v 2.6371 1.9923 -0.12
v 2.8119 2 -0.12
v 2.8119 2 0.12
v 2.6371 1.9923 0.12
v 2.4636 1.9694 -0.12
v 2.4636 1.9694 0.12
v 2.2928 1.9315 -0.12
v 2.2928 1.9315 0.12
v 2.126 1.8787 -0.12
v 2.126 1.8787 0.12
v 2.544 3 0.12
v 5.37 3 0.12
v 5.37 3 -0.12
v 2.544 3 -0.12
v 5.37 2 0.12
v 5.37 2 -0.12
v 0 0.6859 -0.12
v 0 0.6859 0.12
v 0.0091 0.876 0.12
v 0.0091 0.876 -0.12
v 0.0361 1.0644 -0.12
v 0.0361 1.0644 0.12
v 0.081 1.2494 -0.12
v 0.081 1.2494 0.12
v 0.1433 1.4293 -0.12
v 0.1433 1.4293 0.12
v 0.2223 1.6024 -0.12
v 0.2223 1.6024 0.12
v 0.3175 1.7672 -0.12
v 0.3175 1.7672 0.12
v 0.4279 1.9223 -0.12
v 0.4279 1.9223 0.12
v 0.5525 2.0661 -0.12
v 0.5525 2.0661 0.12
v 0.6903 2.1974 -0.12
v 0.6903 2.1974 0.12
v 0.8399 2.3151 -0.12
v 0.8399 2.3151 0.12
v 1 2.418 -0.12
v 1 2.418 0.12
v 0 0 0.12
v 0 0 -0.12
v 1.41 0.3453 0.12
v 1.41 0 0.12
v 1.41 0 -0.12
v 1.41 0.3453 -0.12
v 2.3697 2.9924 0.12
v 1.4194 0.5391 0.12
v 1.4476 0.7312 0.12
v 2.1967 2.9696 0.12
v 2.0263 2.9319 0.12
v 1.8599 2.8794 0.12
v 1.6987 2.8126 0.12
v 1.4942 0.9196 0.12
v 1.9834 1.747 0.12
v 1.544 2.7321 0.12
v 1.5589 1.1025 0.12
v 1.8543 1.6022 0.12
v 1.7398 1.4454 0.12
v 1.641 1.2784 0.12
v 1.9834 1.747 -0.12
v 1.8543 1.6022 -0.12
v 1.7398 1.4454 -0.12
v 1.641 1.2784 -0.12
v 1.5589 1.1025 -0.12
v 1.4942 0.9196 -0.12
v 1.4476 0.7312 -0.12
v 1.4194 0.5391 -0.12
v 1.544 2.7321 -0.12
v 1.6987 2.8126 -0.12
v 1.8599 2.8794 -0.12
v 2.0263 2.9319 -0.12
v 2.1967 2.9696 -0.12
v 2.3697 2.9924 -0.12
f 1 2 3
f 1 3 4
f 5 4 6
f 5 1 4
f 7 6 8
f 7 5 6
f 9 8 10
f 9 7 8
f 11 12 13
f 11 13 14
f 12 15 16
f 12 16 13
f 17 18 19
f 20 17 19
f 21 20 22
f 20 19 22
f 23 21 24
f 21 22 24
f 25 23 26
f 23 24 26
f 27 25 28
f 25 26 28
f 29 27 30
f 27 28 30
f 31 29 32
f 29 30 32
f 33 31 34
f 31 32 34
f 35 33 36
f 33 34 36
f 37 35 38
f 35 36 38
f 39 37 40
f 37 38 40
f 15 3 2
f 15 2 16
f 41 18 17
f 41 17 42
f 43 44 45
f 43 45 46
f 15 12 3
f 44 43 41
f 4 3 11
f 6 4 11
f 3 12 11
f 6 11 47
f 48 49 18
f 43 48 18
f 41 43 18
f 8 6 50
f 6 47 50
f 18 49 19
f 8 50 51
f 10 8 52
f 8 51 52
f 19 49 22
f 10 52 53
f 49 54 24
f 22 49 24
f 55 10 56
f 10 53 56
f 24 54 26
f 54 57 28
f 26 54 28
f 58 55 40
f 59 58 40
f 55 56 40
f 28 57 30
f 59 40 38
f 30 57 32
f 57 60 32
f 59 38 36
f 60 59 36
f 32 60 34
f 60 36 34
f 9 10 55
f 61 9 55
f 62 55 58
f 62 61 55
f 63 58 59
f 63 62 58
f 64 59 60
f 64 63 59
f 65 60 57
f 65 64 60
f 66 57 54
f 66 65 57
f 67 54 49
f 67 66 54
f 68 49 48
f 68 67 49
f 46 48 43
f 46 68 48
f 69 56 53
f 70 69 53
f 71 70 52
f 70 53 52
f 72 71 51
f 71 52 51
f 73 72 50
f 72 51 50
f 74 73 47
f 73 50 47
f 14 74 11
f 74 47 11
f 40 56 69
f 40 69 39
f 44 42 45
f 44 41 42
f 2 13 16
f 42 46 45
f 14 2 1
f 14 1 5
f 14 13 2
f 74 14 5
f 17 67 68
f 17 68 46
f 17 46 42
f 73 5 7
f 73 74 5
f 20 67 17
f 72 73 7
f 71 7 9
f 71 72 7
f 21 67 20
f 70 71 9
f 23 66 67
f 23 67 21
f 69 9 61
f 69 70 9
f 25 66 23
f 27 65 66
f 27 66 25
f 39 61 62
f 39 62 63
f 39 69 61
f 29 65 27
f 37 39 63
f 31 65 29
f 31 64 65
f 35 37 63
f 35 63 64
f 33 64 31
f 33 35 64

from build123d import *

# Parameters (mm, degrees)
BOSS_EXTRUDE1_DEPTH = 0.12
FILLET1_R           = 2


with BuildPart() as part:
    # Sketch1 → Boss-Extrude1 (new, symmetric)
    with BuildSketch(Plane.XY):
        Polygon((0, 0), (1.41, 0), (1.41, 1.5), (2.276025404, 2), (5.37, 2), (5.37, 3), (2.008076211, 3), (0, 1.840636659), align=None)
    extrude(amount=BOSS_EXTRUDE1_DEPTH, both=True)

    # Fillet1
    # the kernel refuses this fillet: 2 mm, written as the material it adds along each edge
    with BuildSketch(Plane(origin=(1.41, 1.5, -0.12), x_dir=(0.8660254037844385, 0.5000000000000003, 0), z_dir=(0, 0, 1))) as fillet1_piece_1:
        with BuildLine():
            CenterArc((FILLET1_R * 0.57735026919, -FILLET1_R), FILLET1_R, 90, 60)
            Line((-FILLET1_R * 0.288675134595, -FILLET1_R * 0.5), (0, 0))
            Line((0, 0), (FILLET1_R * 0.57735026919, 0))
        make_face()
    extrude(amount=0.24)
    with BuildSketch(Plane(origin=(2.276025404, 2, -0.12), x_dir=(1, 0, 0), z_dir=(0, 0, 1))) as fillet1_piece_2:
        with BuildLine():
            CenterArc((FILLET1_R * 0.267949192431, -FILLET1_R), FILLET1_R, 90, 30)
            Line((-FILLET1_R * 0.232050807569, -FILLET1_R * 0.133974596216), (0, 0))
            Line((0, 0), (FILLET1_R * 0.267949192431, 0))
        make_face()
    extrude(amount=0.24)
    # the kernel refuses this fillet: 2 mm, written as the material it takes off along each edge
    with BuildSketch(Plane(origin=(2.008076211, 3, 1.459745962), x_dir=(-0.8660254037844389, -0.4999999999999996, 0), z_dir=(0, 0, -1))) as fillet1_2_piece_1:
        with BuildLine():
            CenterArc((FILLET1_R * 0.267949192431, -FILLET1_R), FILLET1_R, 90, 30)
            Line((-FILLET1_R * 0.232050807569, -FILLET1_R * 0.133974596216), (0, 0))
            Line((0, 0), (FILLET1_R * 0.267949192431, 0))
        make_face()
    extrude(amount=2.919491924, mode=Mode.SUBTRACT)
    with BuildSketch(Plane(origin=(0, 1.840636659, 3.006751346), x_dir=(0, -1, 0), z_dir=(0, 0, -1))) as fillet1_2_piece_2:
        with BuildLine():
            CenterArc((FILLET1_R * 0.57735026919, -FILLET1_R), FILLET1_R, 90, 60)
            Line((-FILLET1_R * 0.288675134595, -FILLET1_R * 0.5), (0, 0))
            Line((0, 0), (FILLET1_R * 0.57735026919, 0))
        make_face()
    extrude(amount=6.013502692, mode=Mode.SUBTRACT)


solid = part.part
